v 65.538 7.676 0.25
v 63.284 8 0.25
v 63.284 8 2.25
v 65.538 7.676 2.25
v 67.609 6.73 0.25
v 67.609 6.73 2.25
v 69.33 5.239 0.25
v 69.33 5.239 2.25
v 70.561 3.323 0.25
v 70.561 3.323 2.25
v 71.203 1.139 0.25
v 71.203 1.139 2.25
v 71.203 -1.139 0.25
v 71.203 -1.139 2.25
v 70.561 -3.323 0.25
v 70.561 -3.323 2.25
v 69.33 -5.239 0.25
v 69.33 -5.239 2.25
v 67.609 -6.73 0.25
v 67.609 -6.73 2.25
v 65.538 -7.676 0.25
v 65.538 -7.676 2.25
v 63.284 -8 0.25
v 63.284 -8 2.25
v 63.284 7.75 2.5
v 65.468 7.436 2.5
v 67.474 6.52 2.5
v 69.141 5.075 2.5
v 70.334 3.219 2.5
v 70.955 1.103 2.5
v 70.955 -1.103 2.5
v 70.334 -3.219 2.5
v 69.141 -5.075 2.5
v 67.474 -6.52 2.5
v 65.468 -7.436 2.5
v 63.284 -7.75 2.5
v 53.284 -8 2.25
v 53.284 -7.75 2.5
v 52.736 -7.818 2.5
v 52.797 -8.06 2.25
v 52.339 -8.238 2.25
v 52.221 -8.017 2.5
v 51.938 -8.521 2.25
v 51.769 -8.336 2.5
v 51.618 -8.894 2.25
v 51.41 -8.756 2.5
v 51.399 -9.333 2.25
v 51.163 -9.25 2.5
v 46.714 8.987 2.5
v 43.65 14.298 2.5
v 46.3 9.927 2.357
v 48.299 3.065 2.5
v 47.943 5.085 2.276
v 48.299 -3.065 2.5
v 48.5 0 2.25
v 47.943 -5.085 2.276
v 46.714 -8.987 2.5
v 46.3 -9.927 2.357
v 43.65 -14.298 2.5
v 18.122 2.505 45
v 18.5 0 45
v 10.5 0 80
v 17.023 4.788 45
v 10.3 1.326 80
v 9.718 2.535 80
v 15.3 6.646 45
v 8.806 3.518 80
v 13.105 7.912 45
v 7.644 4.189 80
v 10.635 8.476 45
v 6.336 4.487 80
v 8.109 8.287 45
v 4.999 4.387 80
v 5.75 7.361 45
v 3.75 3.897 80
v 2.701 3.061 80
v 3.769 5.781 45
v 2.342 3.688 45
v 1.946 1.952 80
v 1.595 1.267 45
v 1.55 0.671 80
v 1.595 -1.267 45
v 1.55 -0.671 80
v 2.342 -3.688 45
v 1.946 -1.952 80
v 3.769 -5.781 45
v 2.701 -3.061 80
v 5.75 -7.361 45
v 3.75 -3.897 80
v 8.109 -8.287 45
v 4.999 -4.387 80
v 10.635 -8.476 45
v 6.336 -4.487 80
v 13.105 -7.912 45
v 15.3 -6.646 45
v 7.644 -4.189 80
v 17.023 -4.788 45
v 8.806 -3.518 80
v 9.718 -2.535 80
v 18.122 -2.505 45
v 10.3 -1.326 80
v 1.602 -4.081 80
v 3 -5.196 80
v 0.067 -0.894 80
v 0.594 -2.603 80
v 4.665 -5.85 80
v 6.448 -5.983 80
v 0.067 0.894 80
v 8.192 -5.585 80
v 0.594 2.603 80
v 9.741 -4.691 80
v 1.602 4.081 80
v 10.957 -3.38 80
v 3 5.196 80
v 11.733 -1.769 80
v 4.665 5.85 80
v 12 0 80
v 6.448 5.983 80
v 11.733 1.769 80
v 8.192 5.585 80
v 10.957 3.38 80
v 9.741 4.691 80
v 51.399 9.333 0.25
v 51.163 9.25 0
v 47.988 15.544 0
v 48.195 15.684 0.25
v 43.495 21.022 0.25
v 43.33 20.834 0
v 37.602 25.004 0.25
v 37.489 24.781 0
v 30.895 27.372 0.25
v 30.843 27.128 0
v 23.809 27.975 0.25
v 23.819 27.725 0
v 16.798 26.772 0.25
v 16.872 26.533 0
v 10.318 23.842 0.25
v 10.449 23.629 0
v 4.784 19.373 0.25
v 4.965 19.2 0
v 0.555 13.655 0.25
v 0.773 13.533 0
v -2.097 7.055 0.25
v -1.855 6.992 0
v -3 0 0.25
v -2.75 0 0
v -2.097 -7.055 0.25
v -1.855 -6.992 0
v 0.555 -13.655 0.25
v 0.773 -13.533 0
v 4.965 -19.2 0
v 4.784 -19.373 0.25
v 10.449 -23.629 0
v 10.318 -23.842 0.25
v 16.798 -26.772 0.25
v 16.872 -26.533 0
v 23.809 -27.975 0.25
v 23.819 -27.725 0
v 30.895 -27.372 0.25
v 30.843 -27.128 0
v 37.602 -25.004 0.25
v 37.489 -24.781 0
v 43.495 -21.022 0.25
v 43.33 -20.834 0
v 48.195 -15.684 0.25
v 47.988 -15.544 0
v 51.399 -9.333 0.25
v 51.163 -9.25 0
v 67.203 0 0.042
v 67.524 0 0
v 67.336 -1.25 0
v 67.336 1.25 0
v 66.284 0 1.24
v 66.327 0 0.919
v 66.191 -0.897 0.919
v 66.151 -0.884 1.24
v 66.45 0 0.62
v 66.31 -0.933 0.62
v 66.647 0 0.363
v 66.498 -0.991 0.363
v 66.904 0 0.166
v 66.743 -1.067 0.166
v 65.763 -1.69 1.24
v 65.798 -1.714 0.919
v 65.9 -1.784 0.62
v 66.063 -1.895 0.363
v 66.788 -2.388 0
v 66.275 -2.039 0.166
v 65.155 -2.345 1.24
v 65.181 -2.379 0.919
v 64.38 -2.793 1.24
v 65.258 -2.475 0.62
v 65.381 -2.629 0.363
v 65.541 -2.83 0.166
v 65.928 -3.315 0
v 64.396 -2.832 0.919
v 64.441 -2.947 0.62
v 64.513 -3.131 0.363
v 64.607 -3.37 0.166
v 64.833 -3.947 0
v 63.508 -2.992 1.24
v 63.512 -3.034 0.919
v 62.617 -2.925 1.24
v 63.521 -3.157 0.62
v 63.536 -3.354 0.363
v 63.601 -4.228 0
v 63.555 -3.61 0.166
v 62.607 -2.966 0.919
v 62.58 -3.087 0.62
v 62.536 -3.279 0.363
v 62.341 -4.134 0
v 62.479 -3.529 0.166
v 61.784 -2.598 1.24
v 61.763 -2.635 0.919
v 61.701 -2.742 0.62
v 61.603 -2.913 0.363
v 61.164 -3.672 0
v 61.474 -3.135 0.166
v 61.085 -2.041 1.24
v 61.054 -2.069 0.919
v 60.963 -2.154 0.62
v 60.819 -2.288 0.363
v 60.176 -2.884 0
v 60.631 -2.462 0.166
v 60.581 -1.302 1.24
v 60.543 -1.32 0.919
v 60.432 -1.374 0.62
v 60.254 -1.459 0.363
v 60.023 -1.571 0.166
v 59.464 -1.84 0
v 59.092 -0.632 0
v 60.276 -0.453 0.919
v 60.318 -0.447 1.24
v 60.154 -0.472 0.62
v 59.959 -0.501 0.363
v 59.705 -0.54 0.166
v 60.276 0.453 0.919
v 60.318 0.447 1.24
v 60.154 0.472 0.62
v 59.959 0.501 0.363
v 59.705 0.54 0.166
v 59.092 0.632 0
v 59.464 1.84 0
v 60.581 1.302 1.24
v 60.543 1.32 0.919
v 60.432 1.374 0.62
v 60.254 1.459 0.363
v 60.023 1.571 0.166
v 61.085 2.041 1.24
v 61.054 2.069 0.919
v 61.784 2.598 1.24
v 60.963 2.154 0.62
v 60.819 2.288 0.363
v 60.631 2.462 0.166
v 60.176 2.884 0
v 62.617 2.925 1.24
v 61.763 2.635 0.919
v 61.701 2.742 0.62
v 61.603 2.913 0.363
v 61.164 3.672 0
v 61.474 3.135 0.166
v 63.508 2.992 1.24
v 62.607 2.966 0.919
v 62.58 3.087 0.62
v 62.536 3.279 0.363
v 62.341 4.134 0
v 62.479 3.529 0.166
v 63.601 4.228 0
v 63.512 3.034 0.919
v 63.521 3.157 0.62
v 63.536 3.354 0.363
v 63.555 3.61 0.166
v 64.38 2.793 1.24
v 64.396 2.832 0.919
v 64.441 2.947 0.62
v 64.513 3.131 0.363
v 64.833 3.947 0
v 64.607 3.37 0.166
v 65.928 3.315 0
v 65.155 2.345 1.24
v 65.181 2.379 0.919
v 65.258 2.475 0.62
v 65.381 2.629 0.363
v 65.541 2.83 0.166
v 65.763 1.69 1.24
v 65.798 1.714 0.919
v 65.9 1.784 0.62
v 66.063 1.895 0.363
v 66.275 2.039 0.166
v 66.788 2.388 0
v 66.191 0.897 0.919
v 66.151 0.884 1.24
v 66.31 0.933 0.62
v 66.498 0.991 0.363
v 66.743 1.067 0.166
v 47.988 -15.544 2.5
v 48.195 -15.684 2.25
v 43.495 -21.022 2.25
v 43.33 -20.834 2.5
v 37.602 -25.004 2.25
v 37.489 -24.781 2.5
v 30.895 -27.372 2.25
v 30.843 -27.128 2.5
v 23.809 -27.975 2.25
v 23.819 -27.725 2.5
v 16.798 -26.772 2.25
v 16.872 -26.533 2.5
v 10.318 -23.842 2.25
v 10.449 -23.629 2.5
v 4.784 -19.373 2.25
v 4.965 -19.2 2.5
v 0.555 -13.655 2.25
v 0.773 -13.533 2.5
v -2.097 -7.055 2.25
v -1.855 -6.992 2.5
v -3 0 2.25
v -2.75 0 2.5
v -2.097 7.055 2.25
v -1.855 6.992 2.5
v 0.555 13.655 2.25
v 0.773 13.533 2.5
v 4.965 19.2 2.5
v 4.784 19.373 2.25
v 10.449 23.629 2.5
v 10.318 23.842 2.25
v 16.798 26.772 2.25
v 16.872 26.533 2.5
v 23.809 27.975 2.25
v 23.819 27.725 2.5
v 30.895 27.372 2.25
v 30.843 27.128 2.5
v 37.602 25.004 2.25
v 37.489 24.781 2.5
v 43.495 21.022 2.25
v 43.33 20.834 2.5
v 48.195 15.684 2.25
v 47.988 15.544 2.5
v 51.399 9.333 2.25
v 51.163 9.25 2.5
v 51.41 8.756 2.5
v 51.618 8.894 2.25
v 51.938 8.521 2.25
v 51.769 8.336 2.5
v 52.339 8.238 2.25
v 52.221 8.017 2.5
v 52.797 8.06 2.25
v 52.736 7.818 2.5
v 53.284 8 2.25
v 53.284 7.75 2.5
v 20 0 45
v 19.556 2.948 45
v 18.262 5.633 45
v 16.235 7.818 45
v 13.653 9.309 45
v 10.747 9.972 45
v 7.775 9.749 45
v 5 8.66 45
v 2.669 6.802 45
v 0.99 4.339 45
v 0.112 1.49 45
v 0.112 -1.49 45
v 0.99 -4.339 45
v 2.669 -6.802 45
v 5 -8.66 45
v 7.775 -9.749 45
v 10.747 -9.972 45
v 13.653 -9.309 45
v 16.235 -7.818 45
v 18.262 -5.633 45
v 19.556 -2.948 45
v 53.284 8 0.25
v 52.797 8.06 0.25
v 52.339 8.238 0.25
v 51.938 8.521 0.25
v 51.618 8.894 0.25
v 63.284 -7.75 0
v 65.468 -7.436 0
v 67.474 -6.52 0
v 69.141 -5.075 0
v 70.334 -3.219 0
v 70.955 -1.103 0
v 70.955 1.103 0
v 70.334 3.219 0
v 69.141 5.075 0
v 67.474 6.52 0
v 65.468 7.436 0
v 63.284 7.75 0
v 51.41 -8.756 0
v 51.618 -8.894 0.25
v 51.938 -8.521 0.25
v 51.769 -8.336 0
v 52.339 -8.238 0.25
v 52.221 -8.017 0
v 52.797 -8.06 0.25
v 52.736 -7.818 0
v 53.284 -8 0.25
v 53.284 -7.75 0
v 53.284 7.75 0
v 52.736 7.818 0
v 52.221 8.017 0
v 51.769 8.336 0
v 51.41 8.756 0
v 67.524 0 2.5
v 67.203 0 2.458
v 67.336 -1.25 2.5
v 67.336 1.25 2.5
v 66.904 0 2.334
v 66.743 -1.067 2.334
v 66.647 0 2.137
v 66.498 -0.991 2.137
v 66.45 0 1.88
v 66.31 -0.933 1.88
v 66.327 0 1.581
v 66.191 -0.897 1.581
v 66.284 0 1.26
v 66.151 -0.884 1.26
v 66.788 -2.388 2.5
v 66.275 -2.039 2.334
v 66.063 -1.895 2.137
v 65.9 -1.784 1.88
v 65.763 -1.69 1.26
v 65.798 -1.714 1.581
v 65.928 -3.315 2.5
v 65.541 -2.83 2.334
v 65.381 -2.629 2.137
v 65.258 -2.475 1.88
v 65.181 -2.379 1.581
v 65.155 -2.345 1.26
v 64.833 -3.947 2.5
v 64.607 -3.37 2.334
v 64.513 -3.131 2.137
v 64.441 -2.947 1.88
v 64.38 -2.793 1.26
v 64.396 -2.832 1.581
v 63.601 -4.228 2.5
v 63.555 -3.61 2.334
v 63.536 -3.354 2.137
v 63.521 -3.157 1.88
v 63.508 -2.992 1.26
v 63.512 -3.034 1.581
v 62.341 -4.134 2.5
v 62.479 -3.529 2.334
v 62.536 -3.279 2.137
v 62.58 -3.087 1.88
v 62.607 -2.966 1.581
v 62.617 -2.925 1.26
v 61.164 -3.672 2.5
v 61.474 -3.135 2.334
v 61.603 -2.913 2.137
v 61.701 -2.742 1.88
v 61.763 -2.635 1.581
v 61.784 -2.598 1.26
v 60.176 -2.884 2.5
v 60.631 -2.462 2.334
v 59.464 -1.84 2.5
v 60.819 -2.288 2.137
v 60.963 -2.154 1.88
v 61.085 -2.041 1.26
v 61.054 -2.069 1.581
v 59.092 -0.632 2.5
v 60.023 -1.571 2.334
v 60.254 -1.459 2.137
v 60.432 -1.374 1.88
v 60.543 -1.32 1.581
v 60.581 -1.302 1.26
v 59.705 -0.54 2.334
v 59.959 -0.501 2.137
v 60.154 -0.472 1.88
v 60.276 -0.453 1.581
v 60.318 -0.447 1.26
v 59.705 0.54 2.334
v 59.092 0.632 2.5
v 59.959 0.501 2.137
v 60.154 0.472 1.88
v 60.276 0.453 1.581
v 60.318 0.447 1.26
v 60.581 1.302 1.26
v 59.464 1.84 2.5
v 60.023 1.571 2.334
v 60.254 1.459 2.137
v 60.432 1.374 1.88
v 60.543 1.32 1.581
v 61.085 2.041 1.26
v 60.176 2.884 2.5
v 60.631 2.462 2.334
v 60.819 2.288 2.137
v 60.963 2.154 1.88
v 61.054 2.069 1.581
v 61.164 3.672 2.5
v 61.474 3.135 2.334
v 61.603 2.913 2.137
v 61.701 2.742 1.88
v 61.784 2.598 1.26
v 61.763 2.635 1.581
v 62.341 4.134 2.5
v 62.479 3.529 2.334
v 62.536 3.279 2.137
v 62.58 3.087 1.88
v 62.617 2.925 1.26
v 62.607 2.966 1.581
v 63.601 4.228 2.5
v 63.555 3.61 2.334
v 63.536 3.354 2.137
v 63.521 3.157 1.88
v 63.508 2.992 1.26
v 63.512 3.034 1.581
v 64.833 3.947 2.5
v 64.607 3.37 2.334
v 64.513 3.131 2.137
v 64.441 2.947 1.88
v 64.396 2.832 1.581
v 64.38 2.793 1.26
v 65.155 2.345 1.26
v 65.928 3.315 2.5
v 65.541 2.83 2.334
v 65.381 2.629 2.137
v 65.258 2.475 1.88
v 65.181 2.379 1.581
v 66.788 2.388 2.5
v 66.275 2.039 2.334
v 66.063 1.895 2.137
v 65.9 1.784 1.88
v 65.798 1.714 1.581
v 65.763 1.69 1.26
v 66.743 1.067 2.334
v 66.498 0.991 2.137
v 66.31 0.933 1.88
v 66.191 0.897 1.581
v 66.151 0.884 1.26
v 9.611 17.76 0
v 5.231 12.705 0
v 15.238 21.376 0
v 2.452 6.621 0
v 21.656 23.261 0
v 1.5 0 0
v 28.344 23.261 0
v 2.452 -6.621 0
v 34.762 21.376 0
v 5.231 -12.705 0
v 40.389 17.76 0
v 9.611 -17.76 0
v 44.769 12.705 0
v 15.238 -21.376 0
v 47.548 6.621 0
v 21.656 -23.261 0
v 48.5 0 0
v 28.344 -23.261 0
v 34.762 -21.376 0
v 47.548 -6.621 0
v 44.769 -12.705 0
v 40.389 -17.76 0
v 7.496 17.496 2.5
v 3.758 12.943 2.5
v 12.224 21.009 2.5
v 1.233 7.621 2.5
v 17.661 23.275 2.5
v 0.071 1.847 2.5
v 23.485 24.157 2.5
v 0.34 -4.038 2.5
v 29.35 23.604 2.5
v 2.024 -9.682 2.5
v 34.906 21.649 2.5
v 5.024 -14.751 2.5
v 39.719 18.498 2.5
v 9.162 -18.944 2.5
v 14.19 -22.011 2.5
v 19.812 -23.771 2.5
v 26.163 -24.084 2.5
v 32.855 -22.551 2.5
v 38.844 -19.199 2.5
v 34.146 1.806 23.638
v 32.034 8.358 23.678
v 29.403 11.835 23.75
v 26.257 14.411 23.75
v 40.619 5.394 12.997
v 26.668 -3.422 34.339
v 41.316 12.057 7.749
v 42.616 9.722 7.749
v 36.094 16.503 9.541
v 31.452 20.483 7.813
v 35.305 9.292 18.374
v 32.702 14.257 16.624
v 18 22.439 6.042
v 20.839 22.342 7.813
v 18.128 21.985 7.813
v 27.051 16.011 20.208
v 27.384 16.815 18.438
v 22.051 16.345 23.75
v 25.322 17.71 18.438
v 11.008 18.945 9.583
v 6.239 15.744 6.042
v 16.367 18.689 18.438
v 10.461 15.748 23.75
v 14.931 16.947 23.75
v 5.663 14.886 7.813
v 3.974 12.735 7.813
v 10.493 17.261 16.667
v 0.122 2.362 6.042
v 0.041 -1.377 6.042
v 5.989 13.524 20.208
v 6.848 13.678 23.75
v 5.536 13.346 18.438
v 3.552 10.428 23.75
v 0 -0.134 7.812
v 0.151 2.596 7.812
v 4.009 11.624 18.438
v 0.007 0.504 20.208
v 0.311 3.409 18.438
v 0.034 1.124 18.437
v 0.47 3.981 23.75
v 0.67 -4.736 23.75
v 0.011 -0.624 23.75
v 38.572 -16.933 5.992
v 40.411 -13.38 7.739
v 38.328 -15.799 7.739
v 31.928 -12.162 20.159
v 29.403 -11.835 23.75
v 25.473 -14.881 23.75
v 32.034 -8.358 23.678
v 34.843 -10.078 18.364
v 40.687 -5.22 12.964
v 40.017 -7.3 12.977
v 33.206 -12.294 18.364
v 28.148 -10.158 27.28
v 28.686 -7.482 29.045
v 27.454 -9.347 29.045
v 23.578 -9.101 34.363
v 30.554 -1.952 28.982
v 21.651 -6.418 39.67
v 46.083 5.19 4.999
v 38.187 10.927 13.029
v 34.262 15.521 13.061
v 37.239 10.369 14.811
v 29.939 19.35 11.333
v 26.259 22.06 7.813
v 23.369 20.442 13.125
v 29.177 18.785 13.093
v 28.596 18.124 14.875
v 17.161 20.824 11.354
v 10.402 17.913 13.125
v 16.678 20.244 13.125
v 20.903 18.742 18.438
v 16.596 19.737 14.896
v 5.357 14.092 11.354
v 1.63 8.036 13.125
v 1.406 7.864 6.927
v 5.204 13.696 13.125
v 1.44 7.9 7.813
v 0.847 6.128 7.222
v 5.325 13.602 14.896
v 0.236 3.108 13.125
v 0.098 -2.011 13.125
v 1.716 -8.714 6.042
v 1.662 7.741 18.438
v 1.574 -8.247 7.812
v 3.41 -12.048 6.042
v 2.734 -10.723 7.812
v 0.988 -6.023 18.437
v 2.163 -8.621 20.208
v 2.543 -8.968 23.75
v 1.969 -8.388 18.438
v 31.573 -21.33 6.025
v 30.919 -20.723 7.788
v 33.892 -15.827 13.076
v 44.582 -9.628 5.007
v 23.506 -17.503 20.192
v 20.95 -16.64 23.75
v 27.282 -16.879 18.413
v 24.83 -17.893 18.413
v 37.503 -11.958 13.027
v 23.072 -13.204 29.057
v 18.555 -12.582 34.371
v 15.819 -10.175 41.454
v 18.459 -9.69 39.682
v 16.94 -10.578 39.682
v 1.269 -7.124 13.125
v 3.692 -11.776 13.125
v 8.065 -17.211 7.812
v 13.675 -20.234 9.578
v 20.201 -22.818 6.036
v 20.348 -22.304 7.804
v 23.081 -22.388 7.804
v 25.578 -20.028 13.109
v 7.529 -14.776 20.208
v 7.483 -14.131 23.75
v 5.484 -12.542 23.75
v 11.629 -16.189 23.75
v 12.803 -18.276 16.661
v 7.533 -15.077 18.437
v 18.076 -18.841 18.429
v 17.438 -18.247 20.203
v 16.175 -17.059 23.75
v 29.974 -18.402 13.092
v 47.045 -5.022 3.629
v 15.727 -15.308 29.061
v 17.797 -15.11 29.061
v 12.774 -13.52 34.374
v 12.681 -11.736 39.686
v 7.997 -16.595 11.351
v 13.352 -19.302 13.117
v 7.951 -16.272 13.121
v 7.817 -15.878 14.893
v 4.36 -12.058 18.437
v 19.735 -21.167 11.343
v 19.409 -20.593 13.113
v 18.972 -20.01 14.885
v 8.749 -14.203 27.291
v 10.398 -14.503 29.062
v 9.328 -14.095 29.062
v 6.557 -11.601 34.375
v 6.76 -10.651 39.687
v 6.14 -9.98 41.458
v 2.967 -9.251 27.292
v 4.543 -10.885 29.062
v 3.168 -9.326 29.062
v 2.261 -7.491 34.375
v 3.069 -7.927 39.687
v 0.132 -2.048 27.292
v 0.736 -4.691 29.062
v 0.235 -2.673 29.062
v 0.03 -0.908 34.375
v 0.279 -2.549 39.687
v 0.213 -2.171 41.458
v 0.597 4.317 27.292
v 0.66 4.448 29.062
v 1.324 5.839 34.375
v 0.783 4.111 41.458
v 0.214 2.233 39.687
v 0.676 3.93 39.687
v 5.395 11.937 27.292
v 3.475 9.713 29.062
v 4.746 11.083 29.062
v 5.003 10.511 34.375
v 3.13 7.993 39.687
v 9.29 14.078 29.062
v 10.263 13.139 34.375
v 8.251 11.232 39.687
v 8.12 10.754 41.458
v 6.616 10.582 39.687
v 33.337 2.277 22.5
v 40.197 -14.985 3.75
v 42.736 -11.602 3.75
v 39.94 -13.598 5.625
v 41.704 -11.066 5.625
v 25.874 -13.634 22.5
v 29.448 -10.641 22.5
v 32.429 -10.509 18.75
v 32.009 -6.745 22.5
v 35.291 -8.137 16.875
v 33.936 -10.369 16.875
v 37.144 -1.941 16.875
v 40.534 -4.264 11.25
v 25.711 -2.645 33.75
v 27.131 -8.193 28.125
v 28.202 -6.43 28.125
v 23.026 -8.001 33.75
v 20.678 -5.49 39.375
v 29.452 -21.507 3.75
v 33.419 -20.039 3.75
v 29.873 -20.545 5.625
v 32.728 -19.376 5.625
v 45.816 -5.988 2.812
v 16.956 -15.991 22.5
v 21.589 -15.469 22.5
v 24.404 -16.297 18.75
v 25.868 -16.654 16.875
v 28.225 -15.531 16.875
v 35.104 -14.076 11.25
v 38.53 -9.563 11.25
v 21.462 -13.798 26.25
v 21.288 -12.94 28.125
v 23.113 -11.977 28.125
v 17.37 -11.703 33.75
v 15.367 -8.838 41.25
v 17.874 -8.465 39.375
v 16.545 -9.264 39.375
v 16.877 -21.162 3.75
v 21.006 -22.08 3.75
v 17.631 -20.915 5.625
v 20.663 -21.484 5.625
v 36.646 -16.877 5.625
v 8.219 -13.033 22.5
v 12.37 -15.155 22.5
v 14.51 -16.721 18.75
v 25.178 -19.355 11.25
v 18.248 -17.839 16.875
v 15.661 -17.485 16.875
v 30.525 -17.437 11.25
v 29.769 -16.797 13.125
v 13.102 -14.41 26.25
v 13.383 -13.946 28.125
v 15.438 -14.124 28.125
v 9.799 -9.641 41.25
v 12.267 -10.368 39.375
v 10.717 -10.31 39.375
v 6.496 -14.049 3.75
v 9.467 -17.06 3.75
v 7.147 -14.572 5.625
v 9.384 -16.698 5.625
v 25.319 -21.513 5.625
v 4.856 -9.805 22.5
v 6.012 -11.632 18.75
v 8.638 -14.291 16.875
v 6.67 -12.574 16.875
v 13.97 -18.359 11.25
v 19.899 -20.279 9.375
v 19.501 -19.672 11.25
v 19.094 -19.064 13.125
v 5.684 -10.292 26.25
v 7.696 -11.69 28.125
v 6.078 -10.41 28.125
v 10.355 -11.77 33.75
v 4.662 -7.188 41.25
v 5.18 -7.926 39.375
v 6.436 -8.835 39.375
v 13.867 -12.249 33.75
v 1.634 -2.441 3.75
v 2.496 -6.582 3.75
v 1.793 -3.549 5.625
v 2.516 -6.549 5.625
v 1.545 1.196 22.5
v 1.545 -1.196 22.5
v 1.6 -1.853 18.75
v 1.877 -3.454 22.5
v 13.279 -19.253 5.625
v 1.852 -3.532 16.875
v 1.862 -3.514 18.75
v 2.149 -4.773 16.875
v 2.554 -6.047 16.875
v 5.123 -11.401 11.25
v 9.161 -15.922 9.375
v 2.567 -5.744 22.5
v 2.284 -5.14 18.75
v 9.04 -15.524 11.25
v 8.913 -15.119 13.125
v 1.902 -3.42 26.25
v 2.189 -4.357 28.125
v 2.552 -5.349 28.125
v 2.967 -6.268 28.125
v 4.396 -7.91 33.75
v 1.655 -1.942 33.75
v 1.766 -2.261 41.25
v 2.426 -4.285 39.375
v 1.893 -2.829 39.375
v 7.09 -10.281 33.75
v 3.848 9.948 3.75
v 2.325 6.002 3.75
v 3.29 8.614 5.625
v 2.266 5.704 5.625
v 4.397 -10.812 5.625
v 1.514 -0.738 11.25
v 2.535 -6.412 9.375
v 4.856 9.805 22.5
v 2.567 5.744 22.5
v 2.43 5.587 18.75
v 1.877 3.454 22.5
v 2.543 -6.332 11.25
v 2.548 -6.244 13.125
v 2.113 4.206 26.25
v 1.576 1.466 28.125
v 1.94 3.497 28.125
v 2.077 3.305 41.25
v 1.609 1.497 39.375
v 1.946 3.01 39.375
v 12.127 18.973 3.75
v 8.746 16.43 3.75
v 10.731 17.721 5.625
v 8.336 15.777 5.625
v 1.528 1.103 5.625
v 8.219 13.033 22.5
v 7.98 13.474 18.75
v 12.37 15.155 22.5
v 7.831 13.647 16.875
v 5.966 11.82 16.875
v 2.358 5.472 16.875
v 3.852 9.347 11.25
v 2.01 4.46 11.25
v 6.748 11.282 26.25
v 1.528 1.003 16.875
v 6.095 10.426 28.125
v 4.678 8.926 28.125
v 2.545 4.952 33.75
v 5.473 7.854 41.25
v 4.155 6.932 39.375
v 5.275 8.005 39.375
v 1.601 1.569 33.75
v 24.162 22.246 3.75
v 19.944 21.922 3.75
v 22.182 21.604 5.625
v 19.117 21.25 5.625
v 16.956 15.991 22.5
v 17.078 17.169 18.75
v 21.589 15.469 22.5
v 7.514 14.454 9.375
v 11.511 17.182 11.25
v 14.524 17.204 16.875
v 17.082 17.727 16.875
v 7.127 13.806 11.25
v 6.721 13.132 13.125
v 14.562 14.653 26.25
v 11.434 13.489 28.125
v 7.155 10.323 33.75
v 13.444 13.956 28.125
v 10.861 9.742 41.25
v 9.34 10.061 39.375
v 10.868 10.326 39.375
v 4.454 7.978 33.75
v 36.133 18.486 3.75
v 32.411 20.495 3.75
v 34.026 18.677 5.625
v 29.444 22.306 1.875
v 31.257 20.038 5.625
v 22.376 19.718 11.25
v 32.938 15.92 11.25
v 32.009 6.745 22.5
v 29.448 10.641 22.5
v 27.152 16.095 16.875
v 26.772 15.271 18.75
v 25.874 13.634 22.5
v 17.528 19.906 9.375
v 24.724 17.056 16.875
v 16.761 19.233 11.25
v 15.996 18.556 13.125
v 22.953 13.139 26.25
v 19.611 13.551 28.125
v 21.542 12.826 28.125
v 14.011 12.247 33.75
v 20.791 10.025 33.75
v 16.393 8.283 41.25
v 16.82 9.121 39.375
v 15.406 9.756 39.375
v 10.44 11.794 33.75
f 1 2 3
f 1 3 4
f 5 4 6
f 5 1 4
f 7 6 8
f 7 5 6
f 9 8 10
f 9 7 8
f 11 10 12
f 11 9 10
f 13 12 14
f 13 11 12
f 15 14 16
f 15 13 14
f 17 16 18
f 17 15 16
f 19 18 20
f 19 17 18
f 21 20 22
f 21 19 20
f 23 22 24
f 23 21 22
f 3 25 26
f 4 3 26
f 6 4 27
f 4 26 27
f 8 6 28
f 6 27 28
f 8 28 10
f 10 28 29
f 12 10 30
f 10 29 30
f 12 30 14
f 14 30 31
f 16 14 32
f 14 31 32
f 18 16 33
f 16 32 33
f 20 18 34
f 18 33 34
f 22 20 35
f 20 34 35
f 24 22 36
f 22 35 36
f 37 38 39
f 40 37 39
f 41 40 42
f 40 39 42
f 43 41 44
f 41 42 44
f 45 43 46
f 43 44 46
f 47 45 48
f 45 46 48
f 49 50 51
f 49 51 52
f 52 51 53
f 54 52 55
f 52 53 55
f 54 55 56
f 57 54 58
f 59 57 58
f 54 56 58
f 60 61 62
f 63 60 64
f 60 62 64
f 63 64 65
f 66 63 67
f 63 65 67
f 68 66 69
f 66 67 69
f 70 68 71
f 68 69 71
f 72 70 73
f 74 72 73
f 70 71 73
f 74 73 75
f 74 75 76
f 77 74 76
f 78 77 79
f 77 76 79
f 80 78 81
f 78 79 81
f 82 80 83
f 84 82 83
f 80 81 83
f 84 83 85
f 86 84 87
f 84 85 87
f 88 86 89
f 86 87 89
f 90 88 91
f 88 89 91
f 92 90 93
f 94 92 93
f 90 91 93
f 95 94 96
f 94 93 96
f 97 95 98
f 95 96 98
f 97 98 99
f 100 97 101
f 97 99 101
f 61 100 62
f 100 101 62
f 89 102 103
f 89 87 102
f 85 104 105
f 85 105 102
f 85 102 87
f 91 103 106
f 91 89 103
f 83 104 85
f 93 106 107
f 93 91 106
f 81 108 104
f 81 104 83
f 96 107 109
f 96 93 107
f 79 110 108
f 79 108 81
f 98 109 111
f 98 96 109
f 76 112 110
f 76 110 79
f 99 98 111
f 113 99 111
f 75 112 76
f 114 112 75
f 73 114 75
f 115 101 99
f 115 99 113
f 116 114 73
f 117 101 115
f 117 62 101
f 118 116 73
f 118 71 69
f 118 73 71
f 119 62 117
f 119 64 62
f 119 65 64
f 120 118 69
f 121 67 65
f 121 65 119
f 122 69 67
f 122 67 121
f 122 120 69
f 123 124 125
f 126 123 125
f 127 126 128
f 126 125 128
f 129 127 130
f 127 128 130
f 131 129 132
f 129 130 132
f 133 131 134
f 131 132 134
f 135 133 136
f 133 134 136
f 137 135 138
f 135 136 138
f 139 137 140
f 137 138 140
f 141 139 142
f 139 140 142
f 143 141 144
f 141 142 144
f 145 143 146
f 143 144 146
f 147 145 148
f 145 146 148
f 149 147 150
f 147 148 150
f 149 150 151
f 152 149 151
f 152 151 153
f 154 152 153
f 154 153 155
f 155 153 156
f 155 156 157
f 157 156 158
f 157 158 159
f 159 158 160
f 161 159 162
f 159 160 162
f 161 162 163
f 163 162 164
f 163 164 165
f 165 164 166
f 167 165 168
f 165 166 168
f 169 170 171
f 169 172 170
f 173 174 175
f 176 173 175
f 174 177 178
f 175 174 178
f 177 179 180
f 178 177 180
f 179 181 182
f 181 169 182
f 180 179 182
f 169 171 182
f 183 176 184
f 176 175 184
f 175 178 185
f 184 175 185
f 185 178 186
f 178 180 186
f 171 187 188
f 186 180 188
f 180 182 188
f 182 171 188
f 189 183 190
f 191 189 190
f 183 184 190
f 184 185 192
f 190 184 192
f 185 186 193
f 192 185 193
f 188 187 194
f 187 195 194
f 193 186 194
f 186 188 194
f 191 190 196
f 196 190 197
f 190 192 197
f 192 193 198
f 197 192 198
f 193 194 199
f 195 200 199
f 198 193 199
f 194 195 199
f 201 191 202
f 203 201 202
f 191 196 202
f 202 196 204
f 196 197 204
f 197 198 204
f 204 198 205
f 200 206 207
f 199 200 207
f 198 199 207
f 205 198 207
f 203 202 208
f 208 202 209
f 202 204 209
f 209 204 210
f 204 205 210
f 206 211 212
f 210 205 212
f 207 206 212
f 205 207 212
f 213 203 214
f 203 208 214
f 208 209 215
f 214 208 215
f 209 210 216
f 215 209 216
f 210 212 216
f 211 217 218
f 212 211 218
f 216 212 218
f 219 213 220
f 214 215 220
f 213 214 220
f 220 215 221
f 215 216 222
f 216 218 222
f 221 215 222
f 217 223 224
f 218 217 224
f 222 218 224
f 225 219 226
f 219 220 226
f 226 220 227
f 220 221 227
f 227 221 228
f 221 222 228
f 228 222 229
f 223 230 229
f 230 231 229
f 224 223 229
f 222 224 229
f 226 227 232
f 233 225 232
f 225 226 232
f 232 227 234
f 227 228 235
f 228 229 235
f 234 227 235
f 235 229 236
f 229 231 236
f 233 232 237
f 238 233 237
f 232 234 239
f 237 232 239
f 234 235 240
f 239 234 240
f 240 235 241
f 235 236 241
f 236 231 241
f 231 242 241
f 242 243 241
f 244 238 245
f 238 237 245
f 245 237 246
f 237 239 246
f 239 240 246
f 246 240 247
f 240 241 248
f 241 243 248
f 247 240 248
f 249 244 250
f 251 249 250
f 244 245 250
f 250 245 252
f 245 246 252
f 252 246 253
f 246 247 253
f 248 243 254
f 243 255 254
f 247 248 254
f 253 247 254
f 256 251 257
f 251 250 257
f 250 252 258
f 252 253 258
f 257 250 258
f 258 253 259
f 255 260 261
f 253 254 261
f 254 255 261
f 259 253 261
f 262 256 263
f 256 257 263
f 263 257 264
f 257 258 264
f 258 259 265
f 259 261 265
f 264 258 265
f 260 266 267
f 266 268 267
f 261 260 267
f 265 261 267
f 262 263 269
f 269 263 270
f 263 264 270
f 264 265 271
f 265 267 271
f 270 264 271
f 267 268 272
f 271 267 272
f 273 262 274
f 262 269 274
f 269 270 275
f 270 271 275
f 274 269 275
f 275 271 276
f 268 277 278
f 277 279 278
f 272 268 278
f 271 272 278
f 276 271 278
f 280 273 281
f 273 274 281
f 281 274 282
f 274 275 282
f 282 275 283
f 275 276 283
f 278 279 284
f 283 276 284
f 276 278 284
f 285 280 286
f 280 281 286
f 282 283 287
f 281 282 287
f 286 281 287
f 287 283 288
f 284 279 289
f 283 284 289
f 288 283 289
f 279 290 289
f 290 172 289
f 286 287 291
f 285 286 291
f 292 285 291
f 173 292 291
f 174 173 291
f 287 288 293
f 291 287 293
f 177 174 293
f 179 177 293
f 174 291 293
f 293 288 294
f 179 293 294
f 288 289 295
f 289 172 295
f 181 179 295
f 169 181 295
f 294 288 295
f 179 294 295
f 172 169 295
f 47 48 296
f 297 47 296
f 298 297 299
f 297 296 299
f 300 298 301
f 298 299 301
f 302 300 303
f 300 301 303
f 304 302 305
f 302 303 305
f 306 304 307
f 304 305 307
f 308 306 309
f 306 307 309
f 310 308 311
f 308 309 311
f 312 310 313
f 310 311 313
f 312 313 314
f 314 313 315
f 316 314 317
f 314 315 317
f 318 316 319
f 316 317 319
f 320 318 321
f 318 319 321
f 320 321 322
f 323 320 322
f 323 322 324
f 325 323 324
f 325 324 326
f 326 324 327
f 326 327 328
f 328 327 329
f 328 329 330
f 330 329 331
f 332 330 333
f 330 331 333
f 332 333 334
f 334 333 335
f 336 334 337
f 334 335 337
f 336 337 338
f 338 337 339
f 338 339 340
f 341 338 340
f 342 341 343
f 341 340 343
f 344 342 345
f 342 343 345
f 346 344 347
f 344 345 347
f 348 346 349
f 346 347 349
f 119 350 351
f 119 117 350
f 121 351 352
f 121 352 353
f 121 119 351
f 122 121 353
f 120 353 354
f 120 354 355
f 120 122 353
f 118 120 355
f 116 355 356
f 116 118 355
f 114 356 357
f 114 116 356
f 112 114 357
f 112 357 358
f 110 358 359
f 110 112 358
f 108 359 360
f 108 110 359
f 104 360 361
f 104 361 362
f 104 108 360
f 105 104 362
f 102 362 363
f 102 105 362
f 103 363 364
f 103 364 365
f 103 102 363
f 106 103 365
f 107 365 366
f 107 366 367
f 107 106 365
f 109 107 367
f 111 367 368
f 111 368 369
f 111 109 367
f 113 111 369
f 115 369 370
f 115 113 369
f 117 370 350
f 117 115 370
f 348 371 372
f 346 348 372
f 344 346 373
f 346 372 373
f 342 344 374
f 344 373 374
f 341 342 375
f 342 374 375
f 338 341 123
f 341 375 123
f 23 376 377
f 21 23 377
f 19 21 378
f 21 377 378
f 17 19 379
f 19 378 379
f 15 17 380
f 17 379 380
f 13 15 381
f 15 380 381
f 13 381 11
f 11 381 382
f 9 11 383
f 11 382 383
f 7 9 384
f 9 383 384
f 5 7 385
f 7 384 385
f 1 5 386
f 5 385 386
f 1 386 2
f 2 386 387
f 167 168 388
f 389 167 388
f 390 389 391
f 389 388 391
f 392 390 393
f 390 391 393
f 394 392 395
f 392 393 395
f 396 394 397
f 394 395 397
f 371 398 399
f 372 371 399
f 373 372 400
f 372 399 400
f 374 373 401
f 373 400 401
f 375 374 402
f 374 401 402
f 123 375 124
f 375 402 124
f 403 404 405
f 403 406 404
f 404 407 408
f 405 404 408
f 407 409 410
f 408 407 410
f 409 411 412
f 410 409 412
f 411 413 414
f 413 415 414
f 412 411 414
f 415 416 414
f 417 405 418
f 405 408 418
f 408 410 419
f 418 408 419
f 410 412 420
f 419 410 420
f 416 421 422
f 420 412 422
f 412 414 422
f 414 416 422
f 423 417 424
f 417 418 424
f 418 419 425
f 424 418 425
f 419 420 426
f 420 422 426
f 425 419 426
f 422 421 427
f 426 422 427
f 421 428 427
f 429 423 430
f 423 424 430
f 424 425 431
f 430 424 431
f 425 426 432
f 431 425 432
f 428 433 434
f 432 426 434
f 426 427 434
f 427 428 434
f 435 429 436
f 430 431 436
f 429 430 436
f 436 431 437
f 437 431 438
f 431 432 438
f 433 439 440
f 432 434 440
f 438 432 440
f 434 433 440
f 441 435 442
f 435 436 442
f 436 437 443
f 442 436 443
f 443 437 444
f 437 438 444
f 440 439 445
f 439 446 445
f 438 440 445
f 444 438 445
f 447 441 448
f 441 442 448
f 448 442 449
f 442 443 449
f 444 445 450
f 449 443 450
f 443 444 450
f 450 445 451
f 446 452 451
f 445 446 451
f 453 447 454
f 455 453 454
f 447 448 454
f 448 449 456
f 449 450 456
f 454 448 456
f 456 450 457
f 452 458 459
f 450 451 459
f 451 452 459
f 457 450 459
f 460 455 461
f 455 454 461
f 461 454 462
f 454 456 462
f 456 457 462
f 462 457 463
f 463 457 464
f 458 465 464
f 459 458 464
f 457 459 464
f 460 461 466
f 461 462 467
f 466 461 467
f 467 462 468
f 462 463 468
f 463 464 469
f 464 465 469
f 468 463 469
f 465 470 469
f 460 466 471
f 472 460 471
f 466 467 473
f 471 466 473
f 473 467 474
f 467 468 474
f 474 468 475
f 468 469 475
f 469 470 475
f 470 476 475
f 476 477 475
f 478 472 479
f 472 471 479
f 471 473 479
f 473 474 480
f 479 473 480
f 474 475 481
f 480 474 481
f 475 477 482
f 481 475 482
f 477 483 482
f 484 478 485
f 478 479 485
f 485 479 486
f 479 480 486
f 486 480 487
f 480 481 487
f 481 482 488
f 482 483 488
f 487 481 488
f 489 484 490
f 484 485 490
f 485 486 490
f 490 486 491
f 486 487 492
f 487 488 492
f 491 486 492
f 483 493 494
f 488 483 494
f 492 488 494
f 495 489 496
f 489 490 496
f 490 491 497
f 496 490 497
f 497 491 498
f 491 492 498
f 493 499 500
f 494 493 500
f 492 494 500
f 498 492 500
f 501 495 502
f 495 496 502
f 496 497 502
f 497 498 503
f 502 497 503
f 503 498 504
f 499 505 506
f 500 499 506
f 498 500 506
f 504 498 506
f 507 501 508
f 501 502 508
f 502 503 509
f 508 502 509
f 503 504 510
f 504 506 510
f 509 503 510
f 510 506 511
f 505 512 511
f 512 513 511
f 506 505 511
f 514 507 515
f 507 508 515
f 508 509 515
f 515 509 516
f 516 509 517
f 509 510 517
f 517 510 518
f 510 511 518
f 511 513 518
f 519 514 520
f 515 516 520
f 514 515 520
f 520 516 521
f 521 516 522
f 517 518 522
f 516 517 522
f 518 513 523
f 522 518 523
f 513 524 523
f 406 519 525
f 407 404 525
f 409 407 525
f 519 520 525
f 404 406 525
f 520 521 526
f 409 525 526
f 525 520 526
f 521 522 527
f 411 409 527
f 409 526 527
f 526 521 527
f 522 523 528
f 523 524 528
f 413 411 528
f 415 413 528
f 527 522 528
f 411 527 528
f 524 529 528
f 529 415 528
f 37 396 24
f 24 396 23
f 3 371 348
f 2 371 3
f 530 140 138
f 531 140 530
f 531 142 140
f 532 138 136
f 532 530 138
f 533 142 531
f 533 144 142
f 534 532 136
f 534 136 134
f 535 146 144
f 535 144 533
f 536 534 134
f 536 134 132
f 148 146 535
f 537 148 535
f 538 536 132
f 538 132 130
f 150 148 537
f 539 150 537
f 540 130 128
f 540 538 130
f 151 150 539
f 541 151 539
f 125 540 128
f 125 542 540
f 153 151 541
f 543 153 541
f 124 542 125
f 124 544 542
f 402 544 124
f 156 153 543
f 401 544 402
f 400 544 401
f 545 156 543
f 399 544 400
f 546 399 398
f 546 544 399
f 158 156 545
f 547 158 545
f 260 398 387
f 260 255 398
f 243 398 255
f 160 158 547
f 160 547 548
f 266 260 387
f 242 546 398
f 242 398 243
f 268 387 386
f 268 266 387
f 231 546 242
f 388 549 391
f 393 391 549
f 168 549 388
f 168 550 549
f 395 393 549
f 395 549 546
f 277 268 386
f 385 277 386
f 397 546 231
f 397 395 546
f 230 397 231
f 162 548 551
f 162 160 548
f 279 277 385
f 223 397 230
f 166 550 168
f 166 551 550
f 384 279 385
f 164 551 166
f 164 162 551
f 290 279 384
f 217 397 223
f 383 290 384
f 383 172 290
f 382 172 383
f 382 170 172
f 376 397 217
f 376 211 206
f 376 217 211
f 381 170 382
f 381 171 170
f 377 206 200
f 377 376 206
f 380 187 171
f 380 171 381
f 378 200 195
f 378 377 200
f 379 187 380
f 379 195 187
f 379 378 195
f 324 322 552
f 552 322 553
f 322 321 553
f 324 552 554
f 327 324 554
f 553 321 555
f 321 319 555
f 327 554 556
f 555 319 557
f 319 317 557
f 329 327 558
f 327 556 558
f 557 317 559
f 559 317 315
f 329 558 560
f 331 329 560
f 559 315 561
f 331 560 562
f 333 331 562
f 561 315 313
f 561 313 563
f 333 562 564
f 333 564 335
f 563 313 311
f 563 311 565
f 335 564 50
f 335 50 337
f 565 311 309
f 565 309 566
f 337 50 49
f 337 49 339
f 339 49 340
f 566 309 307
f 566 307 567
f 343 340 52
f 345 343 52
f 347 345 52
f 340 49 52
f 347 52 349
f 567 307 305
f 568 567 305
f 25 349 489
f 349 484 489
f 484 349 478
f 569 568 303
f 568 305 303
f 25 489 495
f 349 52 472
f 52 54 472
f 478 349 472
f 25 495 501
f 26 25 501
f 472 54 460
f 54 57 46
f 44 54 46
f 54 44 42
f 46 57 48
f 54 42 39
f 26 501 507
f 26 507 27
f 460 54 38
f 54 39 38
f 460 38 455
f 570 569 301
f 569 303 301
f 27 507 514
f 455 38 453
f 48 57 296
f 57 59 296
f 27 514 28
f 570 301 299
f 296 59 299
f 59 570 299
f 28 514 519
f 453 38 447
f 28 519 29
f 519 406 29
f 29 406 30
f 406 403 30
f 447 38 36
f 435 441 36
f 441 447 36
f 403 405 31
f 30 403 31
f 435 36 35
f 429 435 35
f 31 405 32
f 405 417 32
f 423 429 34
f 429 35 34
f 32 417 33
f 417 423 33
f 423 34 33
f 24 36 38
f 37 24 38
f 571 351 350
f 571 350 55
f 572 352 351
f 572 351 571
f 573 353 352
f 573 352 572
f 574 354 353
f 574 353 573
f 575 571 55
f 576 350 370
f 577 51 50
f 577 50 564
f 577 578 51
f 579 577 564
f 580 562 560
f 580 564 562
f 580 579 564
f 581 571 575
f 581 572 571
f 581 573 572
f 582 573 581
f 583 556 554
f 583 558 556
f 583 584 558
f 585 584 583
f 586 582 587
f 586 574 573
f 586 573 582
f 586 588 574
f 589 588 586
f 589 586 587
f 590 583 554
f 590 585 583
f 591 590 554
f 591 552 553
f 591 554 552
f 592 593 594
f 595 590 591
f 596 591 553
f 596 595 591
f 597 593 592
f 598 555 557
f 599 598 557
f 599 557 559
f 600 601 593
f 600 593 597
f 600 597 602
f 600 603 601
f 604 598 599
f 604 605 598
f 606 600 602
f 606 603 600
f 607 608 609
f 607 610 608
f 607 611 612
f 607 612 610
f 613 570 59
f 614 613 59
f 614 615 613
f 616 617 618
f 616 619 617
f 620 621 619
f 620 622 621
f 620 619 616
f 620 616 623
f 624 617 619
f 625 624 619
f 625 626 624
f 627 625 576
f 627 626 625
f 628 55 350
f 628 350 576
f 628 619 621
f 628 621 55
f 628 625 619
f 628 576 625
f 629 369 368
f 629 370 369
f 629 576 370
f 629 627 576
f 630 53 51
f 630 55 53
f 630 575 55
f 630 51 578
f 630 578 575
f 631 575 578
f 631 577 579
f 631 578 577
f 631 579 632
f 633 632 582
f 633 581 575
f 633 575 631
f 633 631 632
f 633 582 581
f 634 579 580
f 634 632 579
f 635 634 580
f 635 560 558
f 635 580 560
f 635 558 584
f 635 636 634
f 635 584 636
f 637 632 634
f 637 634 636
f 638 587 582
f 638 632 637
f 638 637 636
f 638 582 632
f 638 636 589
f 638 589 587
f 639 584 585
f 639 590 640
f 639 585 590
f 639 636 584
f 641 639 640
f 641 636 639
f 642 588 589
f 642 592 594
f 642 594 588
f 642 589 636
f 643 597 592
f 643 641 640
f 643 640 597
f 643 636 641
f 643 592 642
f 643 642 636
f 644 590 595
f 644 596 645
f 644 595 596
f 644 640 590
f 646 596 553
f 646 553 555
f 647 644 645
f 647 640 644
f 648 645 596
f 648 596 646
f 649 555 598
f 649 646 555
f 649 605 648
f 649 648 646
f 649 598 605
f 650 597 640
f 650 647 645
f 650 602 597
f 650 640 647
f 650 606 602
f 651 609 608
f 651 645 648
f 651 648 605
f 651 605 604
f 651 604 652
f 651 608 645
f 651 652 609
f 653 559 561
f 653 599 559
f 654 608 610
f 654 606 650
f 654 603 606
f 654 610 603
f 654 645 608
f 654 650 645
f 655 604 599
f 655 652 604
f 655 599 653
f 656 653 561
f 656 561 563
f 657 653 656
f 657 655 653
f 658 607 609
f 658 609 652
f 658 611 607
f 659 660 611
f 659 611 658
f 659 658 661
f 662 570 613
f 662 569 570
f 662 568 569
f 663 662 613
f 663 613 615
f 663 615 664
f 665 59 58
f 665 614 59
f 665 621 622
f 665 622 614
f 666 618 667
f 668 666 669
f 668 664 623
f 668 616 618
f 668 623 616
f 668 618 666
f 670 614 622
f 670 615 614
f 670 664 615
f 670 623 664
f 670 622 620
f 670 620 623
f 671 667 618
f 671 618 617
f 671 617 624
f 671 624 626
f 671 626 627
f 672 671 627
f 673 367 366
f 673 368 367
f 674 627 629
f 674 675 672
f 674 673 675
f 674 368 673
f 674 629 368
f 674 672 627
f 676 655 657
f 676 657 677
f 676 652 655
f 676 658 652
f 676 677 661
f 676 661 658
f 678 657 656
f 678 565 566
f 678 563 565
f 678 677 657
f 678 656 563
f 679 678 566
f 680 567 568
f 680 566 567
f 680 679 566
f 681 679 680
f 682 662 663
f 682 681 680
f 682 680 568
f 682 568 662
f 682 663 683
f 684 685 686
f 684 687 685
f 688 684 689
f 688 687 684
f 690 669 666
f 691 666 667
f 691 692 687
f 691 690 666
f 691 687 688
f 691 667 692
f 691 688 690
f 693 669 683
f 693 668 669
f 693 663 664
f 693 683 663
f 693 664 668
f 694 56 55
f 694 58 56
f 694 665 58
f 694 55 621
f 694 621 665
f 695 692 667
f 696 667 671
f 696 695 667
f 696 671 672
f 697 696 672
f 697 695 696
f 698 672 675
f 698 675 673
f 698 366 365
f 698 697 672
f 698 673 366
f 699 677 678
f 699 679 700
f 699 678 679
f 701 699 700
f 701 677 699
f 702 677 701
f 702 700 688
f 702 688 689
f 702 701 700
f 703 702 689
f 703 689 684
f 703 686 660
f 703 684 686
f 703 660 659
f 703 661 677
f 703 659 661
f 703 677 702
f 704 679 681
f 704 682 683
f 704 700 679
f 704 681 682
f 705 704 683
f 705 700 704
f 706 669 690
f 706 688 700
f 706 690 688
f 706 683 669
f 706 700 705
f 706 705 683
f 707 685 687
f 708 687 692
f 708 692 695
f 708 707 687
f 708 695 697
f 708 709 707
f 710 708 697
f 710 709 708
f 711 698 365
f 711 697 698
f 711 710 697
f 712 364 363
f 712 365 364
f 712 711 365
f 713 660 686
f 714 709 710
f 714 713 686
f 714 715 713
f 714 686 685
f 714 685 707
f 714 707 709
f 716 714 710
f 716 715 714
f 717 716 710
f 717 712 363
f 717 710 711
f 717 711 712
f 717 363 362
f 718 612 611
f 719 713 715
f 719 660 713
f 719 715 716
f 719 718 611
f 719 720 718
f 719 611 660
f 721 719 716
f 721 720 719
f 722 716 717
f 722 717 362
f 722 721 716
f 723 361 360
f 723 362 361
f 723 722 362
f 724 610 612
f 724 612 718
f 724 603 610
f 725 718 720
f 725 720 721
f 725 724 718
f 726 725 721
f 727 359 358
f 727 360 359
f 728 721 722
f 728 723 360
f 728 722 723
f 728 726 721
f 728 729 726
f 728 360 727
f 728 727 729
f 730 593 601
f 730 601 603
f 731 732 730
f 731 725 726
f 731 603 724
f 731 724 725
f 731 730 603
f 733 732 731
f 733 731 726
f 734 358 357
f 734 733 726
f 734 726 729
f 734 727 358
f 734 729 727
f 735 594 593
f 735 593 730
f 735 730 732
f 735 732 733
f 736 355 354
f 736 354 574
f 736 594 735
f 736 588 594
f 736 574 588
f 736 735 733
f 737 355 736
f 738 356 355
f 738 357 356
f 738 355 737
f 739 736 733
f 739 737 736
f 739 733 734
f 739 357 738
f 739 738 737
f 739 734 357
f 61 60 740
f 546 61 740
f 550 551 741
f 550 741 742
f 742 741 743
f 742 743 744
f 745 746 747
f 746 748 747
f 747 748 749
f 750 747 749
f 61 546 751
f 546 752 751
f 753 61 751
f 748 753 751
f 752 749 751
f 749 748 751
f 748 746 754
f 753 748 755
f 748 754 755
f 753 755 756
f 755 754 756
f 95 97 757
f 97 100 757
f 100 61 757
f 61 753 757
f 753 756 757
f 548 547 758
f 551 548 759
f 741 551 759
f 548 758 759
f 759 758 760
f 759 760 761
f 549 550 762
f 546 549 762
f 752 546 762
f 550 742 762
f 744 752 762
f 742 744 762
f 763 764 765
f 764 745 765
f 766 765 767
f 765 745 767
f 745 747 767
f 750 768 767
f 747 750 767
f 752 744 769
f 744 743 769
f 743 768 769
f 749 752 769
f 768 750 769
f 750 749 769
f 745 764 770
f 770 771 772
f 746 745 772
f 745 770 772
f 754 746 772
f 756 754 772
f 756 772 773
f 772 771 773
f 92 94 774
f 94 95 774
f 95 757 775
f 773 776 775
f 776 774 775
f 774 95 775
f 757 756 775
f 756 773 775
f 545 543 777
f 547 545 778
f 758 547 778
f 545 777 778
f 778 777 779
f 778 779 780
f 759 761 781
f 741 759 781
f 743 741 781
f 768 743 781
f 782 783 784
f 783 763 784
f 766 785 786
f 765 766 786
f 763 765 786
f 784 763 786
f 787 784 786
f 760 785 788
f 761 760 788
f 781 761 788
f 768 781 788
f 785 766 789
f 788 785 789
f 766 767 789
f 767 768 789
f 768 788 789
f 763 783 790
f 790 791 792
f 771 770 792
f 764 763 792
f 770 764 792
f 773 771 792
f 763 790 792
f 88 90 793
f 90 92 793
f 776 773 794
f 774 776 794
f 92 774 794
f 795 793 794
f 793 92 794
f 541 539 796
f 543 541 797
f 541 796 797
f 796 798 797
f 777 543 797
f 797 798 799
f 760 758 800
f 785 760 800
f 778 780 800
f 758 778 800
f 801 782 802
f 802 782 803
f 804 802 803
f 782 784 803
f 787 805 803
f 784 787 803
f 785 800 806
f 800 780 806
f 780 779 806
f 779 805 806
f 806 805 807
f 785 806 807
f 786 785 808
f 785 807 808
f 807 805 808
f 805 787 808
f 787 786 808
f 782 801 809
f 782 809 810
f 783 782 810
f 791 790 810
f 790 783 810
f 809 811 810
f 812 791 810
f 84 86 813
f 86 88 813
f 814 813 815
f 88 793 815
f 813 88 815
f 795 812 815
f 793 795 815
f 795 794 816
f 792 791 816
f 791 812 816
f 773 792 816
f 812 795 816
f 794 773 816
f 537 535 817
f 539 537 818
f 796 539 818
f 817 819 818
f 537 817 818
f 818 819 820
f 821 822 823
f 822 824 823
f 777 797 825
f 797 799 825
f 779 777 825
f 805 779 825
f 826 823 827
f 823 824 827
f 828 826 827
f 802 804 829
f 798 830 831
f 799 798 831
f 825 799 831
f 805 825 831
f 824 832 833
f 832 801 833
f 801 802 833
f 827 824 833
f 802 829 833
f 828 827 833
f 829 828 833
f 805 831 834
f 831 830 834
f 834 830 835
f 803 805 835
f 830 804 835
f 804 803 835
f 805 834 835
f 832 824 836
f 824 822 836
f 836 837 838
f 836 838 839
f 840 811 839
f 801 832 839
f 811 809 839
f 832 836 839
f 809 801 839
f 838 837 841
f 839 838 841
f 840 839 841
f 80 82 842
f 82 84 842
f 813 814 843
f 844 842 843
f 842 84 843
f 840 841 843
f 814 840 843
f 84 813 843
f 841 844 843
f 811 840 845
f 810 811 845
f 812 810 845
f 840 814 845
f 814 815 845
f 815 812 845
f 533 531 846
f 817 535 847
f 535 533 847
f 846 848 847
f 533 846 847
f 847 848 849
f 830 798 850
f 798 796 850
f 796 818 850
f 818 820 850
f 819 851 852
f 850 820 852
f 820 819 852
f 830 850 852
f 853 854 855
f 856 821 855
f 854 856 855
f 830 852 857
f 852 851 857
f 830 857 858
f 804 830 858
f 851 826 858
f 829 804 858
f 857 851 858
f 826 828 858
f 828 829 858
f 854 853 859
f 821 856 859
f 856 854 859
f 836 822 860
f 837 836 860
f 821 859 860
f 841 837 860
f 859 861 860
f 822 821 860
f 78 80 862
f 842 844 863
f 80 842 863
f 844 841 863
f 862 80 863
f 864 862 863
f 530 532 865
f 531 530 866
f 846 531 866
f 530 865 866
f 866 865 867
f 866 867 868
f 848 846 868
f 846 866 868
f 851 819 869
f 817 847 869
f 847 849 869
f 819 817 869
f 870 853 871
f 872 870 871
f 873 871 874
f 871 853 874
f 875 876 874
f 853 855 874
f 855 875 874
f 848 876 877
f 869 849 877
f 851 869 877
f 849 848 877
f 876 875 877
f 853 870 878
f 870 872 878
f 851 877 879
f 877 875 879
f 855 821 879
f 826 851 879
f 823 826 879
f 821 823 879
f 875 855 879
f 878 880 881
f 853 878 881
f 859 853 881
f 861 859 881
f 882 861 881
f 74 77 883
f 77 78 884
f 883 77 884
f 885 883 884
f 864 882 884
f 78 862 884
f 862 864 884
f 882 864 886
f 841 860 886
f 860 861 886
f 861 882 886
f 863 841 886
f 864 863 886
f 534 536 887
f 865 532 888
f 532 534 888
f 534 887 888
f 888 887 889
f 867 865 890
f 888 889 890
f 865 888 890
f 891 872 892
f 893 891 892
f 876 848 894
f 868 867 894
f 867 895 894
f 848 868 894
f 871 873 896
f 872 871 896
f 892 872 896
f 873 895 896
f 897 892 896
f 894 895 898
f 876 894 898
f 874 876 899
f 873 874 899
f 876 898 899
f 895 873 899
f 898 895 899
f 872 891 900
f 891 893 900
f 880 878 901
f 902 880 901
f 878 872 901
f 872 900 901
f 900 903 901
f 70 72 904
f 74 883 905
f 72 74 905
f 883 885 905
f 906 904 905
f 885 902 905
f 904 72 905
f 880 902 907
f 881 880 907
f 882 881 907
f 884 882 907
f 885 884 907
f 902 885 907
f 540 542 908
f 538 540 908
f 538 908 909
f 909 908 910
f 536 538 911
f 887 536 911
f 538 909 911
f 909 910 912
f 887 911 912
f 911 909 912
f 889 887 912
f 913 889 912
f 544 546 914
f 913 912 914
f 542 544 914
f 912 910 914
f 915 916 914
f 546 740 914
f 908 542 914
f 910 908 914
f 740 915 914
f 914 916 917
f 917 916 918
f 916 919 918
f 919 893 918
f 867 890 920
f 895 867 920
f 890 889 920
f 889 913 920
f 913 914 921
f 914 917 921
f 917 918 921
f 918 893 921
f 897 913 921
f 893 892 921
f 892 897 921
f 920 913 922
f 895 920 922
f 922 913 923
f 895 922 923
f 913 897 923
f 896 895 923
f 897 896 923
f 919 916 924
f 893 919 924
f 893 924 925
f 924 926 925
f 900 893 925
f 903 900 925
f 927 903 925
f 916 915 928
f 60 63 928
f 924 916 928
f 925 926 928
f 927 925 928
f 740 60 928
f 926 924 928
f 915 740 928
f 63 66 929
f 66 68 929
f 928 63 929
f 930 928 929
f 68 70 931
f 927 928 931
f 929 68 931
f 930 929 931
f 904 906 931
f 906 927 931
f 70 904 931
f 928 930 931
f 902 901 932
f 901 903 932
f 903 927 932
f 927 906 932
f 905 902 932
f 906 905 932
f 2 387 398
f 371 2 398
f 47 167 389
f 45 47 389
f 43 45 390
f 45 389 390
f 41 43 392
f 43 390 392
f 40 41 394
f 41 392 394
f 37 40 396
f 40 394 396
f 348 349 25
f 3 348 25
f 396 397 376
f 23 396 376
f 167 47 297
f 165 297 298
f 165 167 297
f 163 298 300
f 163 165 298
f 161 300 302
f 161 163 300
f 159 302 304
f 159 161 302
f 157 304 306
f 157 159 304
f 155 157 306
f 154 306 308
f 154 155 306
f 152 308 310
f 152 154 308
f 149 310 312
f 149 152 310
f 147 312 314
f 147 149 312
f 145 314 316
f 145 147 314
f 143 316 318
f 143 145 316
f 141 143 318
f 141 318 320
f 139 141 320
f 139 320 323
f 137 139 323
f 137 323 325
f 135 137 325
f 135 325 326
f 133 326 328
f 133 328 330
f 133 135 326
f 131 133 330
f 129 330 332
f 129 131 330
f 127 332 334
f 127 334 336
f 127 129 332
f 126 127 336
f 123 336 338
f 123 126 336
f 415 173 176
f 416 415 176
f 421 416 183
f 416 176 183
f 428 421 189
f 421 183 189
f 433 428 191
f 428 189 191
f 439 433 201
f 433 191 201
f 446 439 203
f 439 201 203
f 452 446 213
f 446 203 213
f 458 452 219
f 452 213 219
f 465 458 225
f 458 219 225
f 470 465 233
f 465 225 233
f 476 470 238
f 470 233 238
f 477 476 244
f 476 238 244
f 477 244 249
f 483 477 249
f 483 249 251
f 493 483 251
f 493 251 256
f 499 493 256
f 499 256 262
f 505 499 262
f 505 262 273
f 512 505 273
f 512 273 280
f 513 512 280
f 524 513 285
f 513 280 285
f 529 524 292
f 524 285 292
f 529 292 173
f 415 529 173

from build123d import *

# Parameters (mm, degrees)
SKETCH003_R     = 23.5
SKETCH004_R     = 8.5
SKETCH005_R     = 4.5
SKETCH_R        = 25
SKETCH001_R     = 10
SKETCH002_R     = 6
SKETCH006_R     = 23.5
SKETCH006_R_2   = 3
PAD_DEPTH       = 2.5
FILLET_R        = 1.24
CHAMFER_SIZE    = 0.25
CHAMFER001_SIZE = 0.25


with BuildPart() as funnel_inner:
    # Sketch003 → Loft001 section 0
    with BuildSketch(Plane.XY):
        with Locations((25, 0)):
            Circle(SKETCH003_R)
    # Sketch004 → Loft001 section 1
    with BuildSketch(Plane.XY.offset(45)):
        with Locations((10, 0)):
            Circle(SKETCH004_R)
    # Sketch005 → Loft001 section 2
    with BuildSketch(Plane.XY.offset(80)):
        with Locations((6, 0)):
            Circle(SKETCH005_R)
    loft(ruled=True)


with BuildPart() as brim_bottom_edge_chamfer:
    # Sketch → Loft section 0
    with BuildSketch(Plane.XY):
        with Locations((25, 0)):
            Circle(SKETCH_R)
    # Sketch001 → Loft section 1
    with BuildSketch(Plane.XY.offset(45)):
        with Locations((10, 0)):
            Circle(SKETCH001_R)
    # Sketch002 → Loft section 2
    with BuildSketch(Plane.XY.offset(80)):
        with Locations((6, 0)):
            Circle(SKETCH002_R)
    loft(ruled=True)

    # Cut: cut Funnel inner
    add(funnel_inner.part, mode=Mode.SUBTRACT)

    # Sketch006 → Pad (new body)
    with BuildSketch(Plane(origin=(0, 0, 0), x_dir=(1, 0, 0), z_dir=(0, 0, -1))):
        with BuildLine():
            ThreePointArc((51.398653, 9.333333), (-3, 0), (51.398653, -9.333333))
            ThreePointArc((53.284271, -8), (52.129571, -8.367007), (51.398653, -9.333333))
            Line((53.284271, -8), (63.284271, -8))
            ThreePointArc((63.284271, -8), (71.284271, 0), (63.284271, 8))
            Line((53.284271, 8), (63.284271, 8))
            ThreePointArc((51.398653, 9.333333), (52.129571, 8.367007), (53.284271, 8))
        make_face()
        with Locations((25, 0)):
            Circle(SKETCH006_R, mode=Mode.SUBTRACT)
        with Locations((63.284271, 0)):
            Circle(SKETCH006_R_2, mode=Mode.SUBTRACT)
    extrude(amount=-PAD_DEPTH)

    # Fillet
    fillet_edges = [brim_bottom_edge_chamfer.edges().sort_by_distance(p)[0] for p in [
        (60.284271, 0, 0),
        (60.284271, 0, 2.5),
    ]]
    fillet(fillet_edges, radius=FILLET_R)

    # Chamfer
    chamfer_edges = [brim_bottom_edge_chamfer.edges().sort_by_distance(p)[0] for p in [
        (58.284271, -8, 0),
    ]]
    chamfer(chamfer_edges, length=CHAMFER_SIZE)

    # Chamfer001
    chamfer001_edges = [brim_bottom_edge_chamfer.edges().sort_by_distance(p)[0] for p in [
        (-3, 0, 2.5),
    ]]
    chamfer(chamfer001_edges, length=CHAMFER001_SIZE)


solid = brim_bottom_edge_chamfer.part
